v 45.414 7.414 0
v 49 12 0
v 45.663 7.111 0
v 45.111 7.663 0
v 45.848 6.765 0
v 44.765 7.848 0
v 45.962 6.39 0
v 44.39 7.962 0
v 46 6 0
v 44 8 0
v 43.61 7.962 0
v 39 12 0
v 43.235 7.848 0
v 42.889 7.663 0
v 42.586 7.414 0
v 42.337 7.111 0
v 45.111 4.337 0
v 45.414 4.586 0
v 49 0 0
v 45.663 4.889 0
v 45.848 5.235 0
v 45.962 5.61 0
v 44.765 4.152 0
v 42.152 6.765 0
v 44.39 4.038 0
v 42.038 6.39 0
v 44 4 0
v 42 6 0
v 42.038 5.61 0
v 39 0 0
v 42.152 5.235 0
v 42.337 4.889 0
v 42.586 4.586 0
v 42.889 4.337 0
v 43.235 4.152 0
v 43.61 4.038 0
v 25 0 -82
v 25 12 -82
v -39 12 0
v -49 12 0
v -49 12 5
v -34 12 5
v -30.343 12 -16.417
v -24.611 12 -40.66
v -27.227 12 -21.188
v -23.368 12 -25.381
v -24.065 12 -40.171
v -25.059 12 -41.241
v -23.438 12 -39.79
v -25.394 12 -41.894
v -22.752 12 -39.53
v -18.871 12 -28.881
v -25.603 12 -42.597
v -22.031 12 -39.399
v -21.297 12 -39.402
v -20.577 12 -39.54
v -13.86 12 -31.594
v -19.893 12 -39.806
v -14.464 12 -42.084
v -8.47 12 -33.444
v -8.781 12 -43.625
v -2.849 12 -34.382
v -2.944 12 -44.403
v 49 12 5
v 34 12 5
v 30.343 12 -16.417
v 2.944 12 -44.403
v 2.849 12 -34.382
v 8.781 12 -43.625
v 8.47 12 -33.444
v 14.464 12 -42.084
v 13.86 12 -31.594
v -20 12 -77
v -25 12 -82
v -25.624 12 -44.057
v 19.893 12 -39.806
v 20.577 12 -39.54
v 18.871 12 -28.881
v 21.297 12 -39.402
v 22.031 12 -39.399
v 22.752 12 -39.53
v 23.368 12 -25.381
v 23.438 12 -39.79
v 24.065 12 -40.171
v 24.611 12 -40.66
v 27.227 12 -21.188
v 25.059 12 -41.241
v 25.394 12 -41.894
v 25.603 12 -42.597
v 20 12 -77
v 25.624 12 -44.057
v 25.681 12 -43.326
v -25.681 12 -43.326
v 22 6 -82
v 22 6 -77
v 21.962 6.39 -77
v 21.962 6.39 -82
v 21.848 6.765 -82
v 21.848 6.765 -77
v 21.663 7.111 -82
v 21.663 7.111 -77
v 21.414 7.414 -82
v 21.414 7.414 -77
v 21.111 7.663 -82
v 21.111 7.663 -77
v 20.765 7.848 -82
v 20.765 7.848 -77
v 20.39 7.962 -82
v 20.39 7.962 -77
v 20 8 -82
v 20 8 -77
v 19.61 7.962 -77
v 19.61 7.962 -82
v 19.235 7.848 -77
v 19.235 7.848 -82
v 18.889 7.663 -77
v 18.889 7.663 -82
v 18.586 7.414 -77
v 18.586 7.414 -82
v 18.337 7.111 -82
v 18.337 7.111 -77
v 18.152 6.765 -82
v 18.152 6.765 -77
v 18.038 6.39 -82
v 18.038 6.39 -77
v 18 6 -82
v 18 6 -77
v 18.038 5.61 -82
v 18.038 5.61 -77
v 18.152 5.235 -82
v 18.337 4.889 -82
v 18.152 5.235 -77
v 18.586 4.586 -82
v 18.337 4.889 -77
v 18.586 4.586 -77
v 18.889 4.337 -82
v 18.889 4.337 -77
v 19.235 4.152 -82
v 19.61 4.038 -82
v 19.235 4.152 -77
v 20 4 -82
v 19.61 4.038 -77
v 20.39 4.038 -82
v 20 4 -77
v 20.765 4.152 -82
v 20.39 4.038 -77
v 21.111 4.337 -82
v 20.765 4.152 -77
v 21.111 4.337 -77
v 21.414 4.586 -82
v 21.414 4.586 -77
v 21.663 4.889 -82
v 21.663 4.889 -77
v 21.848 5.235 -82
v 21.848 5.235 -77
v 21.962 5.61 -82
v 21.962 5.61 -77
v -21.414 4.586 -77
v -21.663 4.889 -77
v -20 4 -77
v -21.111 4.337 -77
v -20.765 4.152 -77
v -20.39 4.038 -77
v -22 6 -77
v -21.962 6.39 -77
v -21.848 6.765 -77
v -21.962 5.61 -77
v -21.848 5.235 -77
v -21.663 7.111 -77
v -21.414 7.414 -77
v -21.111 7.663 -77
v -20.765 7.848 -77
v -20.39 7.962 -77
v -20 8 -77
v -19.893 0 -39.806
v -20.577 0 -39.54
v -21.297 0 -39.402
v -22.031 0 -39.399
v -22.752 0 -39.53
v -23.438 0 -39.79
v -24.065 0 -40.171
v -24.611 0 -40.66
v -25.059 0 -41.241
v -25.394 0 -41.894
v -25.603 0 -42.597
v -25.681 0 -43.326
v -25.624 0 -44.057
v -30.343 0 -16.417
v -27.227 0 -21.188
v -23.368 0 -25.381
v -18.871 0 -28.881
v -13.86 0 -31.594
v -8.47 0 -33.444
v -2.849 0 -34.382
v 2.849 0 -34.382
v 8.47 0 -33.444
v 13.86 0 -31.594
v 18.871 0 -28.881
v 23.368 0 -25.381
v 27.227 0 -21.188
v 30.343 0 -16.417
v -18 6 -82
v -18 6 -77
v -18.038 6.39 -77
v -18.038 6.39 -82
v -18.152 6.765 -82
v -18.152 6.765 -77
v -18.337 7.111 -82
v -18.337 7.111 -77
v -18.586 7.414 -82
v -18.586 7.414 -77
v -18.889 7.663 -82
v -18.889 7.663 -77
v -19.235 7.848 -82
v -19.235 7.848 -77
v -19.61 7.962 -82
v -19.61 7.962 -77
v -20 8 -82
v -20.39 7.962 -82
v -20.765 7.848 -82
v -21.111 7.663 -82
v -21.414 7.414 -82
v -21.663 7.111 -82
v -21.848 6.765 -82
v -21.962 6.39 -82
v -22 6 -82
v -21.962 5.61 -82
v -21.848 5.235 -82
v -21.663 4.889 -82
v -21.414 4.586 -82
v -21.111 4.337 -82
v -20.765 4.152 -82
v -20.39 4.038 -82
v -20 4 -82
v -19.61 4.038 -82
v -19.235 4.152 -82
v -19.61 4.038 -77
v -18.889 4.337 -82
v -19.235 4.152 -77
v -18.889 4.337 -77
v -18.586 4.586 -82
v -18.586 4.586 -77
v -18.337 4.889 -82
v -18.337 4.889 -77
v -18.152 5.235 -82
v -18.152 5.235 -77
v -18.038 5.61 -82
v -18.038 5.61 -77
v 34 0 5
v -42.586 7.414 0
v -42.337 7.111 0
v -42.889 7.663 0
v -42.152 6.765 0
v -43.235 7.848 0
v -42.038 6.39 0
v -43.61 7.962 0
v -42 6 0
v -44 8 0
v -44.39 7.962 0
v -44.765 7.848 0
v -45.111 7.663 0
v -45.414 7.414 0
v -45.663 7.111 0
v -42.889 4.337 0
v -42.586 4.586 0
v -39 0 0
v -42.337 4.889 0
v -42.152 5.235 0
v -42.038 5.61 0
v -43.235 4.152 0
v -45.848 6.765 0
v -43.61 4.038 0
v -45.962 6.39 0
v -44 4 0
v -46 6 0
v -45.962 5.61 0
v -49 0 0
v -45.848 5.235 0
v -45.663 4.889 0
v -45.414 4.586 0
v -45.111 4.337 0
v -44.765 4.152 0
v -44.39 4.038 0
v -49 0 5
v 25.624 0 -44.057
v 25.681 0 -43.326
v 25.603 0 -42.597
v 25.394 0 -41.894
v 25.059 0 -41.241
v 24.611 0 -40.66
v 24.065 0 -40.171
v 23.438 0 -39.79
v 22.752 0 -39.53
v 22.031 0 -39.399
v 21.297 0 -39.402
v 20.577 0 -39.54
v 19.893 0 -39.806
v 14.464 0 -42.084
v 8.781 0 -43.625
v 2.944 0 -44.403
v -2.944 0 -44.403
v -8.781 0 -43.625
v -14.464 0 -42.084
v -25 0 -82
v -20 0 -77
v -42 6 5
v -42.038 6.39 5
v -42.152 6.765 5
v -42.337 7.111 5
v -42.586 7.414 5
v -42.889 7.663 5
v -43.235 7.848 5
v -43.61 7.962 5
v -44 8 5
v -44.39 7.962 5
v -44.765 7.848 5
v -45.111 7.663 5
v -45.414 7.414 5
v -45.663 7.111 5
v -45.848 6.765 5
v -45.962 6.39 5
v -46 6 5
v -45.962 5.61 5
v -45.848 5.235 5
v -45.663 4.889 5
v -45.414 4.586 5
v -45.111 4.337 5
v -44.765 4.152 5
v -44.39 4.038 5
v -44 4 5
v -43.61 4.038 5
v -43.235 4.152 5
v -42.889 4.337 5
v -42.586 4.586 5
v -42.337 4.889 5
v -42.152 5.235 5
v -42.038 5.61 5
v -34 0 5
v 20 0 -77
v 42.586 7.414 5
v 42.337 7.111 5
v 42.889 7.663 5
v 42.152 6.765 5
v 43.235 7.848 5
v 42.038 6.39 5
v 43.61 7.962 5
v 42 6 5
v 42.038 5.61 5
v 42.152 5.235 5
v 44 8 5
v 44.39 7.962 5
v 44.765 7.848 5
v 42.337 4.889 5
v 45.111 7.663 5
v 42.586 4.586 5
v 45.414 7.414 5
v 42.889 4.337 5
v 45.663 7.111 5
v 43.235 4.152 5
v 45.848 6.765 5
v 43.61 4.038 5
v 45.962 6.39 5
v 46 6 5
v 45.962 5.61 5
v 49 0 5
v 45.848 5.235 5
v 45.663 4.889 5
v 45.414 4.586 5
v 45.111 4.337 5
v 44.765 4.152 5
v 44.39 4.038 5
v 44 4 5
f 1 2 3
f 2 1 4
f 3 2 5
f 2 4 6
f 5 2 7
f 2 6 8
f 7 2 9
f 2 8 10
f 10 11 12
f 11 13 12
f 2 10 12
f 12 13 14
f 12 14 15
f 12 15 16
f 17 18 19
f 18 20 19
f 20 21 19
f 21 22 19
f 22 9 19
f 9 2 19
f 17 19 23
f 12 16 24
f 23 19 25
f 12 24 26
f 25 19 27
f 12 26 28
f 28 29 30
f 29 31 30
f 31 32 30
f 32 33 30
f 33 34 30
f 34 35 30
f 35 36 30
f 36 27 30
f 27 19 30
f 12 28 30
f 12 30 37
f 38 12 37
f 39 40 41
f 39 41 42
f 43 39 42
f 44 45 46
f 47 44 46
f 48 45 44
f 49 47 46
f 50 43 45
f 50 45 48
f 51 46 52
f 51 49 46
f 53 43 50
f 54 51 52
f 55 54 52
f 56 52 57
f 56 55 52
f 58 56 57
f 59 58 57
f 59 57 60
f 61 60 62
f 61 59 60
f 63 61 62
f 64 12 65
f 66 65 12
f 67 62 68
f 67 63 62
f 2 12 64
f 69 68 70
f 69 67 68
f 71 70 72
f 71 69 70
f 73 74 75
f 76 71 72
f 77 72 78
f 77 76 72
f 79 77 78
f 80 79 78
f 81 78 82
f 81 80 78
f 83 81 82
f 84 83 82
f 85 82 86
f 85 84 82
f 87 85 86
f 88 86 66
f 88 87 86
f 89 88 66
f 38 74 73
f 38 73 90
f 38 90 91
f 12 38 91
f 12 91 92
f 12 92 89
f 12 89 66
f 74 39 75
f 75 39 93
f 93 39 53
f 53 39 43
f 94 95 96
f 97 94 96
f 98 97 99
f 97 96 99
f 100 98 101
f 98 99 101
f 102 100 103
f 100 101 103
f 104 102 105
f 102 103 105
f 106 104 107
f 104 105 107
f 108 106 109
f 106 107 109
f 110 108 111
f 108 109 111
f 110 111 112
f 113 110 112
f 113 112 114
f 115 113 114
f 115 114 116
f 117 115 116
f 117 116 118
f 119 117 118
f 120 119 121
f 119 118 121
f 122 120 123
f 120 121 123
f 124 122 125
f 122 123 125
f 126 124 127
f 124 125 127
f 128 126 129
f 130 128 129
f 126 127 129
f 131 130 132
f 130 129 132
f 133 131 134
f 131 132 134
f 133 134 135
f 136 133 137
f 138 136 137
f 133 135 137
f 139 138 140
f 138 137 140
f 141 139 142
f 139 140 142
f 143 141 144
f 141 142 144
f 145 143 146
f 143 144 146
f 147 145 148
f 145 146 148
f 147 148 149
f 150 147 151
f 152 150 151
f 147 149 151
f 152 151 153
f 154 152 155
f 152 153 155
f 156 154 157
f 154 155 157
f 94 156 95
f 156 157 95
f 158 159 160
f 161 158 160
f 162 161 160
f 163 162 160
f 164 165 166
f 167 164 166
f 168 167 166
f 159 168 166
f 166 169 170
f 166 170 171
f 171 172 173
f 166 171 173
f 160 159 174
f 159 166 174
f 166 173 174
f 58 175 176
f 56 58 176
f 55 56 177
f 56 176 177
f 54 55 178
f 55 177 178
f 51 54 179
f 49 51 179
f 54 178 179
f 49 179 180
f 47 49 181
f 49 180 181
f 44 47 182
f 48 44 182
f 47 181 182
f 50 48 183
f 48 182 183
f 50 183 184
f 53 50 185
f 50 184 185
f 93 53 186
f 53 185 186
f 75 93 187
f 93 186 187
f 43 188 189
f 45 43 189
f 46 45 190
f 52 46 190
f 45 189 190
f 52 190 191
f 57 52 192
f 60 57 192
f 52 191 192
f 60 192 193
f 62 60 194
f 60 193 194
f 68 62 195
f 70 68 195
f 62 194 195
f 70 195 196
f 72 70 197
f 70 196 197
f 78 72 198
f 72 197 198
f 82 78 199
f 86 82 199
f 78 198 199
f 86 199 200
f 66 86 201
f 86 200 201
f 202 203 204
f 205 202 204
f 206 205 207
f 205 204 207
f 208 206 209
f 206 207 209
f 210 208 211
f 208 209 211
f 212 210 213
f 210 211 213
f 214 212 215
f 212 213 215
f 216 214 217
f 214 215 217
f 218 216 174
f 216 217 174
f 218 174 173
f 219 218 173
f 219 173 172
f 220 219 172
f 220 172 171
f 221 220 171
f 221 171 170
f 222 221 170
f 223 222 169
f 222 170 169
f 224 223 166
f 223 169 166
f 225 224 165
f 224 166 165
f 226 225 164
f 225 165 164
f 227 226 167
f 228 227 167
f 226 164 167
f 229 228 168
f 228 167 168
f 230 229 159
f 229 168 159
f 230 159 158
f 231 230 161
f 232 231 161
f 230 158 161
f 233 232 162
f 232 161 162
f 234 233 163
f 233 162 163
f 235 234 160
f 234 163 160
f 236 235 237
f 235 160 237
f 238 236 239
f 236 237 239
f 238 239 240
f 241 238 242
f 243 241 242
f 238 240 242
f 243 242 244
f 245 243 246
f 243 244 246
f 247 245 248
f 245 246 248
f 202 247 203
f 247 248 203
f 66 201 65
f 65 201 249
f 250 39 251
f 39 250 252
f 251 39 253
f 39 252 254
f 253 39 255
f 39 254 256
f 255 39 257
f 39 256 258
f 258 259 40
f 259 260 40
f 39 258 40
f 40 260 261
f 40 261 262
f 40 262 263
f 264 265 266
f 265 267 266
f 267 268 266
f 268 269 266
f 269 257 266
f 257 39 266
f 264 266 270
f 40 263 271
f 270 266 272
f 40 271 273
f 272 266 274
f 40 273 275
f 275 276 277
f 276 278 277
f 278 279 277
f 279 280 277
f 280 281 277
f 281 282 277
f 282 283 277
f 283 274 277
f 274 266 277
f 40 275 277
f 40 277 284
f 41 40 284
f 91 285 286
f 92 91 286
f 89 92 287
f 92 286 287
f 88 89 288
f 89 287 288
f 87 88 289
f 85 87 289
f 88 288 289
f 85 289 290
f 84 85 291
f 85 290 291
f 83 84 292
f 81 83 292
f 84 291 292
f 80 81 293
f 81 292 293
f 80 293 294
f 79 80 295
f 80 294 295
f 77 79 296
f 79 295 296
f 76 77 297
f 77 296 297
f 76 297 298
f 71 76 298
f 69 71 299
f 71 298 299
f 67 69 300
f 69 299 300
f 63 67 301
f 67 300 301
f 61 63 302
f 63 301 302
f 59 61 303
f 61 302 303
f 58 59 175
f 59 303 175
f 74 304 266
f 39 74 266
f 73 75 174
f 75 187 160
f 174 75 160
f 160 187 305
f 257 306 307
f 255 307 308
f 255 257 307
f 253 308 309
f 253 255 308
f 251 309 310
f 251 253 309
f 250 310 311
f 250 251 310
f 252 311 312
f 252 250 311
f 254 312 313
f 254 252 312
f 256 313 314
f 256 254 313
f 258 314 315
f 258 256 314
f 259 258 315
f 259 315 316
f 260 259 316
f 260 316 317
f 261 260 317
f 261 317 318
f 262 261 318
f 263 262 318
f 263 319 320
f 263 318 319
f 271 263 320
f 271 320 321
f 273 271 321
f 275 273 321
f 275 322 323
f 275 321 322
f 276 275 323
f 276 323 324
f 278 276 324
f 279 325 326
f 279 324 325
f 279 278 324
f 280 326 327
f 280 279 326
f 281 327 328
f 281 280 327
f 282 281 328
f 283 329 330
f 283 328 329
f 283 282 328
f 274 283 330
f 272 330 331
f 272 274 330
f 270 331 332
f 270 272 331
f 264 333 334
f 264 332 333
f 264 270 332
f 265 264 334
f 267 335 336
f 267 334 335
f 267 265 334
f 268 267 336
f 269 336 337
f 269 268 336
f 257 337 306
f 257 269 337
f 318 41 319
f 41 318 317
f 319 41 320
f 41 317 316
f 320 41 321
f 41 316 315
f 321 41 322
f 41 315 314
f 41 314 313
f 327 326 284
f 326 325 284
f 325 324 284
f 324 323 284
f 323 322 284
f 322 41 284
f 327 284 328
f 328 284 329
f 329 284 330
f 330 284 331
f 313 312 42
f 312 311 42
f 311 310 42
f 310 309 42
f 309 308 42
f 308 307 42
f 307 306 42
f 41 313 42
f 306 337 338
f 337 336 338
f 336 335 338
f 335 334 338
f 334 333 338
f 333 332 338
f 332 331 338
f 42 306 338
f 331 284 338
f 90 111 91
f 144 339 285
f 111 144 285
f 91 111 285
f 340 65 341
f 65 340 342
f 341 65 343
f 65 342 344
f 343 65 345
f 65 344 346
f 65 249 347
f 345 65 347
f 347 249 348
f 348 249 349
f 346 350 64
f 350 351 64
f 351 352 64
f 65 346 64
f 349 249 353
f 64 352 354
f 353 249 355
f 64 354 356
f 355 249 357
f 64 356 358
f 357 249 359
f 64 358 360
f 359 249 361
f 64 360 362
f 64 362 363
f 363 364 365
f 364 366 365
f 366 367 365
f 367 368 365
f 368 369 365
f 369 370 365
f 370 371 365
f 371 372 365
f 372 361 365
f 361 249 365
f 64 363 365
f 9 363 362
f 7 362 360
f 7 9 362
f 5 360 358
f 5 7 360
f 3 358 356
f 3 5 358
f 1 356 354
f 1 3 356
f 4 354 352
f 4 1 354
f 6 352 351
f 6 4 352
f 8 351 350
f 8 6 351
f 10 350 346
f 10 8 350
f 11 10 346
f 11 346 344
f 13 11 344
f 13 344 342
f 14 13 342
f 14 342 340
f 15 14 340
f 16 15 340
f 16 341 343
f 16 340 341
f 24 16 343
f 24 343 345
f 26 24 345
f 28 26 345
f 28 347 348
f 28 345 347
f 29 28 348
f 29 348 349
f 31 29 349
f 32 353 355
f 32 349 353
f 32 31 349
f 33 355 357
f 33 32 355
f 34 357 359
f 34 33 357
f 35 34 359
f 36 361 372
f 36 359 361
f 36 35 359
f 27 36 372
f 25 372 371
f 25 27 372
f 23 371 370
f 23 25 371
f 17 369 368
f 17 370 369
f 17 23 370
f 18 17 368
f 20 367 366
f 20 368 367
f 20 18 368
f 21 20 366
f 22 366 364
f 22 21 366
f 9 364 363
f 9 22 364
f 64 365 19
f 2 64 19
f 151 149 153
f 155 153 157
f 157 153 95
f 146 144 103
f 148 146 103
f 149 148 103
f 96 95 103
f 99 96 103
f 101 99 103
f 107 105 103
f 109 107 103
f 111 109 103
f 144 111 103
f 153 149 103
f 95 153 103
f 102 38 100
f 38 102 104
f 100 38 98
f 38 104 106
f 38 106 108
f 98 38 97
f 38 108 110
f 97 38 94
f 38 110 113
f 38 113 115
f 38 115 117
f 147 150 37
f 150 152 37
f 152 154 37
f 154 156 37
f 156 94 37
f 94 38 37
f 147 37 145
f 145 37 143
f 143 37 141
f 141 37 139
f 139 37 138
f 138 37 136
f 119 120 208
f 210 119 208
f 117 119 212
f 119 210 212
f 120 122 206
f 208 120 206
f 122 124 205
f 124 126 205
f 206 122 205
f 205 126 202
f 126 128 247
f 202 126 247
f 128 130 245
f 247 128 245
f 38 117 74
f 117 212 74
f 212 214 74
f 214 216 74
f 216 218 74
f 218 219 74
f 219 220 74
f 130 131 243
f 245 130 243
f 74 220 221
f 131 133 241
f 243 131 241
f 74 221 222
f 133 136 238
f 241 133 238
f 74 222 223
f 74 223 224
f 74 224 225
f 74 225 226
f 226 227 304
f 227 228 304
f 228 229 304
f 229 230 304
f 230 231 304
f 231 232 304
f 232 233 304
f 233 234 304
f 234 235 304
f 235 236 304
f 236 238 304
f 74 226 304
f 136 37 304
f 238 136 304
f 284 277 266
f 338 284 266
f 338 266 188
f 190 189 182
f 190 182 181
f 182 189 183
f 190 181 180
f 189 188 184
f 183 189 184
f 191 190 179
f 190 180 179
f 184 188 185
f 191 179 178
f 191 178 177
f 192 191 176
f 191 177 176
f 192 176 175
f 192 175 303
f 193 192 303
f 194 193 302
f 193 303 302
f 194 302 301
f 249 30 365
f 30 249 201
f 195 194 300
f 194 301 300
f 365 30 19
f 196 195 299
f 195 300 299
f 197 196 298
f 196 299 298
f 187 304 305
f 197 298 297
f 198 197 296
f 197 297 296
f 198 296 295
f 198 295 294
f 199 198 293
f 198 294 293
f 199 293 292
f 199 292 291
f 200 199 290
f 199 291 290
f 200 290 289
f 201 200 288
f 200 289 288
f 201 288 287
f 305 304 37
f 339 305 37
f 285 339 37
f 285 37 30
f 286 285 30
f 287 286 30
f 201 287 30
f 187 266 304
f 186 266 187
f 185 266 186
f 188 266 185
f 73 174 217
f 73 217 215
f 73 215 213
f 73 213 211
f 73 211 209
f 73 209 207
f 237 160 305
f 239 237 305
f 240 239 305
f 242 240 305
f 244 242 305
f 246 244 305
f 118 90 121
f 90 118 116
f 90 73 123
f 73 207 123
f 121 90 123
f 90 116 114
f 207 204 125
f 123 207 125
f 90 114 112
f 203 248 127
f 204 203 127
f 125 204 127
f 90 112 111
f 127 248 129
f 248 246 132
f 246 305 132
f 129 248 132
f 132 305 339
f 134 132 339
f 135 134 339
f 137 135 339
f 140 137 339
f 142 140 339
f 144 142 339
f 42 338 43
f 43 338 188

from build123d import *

# Parameters (mm, degrees)
BOSS_EXTRUDE1_DEPTH = 12
SKETCH2_R           = 2
CUT_EXTRUDE4_DEPTH  = 12
CUT_EXTRUDE5_START  = -77
SKETCH2_3_R         = 2
CUT_EXTRUDE5_DEPTH  = 12


with BuildPart() as part:
    # Sketch1 → Boss-Extrude1 (new body)
    with BuildSketch(Plane(origin=(0, 0, 0), x_dir=(1, 0, 0), z_dir=(0, 1, 0))):
        with BuildLine():
            Line((49, -5), (49, 0))
            Line((49, 0), (39, 0))
            Line((39, 0), (25, 82))
            Line((25, 82), (-25, 82))
            Line((-25, 82), (-39, 0))
            Line((-39, 0), (-49, 0))
            Line((-49, 0), (-49, -5))
            Line((-49, -5), (-34, -5))
            Line((-34, -5), (-30.343379621, 16.417347933))
            ThreePointArc((-30.343379621, 16.417347933), (0, 34.5), (30.343379621, 16.417347933))
            Line((30.343379621, 16.417347933), (34, -5))
            Line((34, -5), (49, -5))
        make_face()
        with BuildLine():
            Line((20, 77), (25.624396188, 44.057108045))
            ThreePointArc((25.624396188, 44.057108045), (24.064523617, 40.171296717), (19.893289621, 39.805866754))
            ThreePointArc((19.893289621, 39.805866754), (0, 44.5), (-19.893289621, 39.805866754))
            ThreePointArc((-19.893289621, 39.805866754), (-24.064523617, 40.171296717), (-25.624396188, 44.057108045))
            Line((-25.624396188, 44.057108045), (-20, 77))
            Line((-20, 77), (20, 77))
        make_face(mode=Mode.SUBTRACT)
    extrude(amount=BOSS_EXTRUDE1_DEPTH)

    # Sketch2 → Cut-Extrude4 (cut)
    with BuildSketch(Plane.XY):
        with Locations((-44, 6)):
            Circle(SKETCH2_R)
        with Locations((44, 6)):
            Circle(SKETCH2_R)
    extrude(amount=CUT_EXTRUDE4_DEPTH, mode=Mode.SUBTRACT)

    # Sketch2<3> → Cut-Extrude5 (cut)
    with BuildSketch(Plane.XY.offset(CUT_EXTRUDE5_START)):
        with Locations((-20, 6)):
            Circle(SKETCH2_3_R)
        with Locations((20, 6)):
            Circle(SKETCH2_3_R)
    extrude(amount=-CUT_EXTRUDE5_DEPTH, mode=Mode.SUBTRACT)


solid = part.part
